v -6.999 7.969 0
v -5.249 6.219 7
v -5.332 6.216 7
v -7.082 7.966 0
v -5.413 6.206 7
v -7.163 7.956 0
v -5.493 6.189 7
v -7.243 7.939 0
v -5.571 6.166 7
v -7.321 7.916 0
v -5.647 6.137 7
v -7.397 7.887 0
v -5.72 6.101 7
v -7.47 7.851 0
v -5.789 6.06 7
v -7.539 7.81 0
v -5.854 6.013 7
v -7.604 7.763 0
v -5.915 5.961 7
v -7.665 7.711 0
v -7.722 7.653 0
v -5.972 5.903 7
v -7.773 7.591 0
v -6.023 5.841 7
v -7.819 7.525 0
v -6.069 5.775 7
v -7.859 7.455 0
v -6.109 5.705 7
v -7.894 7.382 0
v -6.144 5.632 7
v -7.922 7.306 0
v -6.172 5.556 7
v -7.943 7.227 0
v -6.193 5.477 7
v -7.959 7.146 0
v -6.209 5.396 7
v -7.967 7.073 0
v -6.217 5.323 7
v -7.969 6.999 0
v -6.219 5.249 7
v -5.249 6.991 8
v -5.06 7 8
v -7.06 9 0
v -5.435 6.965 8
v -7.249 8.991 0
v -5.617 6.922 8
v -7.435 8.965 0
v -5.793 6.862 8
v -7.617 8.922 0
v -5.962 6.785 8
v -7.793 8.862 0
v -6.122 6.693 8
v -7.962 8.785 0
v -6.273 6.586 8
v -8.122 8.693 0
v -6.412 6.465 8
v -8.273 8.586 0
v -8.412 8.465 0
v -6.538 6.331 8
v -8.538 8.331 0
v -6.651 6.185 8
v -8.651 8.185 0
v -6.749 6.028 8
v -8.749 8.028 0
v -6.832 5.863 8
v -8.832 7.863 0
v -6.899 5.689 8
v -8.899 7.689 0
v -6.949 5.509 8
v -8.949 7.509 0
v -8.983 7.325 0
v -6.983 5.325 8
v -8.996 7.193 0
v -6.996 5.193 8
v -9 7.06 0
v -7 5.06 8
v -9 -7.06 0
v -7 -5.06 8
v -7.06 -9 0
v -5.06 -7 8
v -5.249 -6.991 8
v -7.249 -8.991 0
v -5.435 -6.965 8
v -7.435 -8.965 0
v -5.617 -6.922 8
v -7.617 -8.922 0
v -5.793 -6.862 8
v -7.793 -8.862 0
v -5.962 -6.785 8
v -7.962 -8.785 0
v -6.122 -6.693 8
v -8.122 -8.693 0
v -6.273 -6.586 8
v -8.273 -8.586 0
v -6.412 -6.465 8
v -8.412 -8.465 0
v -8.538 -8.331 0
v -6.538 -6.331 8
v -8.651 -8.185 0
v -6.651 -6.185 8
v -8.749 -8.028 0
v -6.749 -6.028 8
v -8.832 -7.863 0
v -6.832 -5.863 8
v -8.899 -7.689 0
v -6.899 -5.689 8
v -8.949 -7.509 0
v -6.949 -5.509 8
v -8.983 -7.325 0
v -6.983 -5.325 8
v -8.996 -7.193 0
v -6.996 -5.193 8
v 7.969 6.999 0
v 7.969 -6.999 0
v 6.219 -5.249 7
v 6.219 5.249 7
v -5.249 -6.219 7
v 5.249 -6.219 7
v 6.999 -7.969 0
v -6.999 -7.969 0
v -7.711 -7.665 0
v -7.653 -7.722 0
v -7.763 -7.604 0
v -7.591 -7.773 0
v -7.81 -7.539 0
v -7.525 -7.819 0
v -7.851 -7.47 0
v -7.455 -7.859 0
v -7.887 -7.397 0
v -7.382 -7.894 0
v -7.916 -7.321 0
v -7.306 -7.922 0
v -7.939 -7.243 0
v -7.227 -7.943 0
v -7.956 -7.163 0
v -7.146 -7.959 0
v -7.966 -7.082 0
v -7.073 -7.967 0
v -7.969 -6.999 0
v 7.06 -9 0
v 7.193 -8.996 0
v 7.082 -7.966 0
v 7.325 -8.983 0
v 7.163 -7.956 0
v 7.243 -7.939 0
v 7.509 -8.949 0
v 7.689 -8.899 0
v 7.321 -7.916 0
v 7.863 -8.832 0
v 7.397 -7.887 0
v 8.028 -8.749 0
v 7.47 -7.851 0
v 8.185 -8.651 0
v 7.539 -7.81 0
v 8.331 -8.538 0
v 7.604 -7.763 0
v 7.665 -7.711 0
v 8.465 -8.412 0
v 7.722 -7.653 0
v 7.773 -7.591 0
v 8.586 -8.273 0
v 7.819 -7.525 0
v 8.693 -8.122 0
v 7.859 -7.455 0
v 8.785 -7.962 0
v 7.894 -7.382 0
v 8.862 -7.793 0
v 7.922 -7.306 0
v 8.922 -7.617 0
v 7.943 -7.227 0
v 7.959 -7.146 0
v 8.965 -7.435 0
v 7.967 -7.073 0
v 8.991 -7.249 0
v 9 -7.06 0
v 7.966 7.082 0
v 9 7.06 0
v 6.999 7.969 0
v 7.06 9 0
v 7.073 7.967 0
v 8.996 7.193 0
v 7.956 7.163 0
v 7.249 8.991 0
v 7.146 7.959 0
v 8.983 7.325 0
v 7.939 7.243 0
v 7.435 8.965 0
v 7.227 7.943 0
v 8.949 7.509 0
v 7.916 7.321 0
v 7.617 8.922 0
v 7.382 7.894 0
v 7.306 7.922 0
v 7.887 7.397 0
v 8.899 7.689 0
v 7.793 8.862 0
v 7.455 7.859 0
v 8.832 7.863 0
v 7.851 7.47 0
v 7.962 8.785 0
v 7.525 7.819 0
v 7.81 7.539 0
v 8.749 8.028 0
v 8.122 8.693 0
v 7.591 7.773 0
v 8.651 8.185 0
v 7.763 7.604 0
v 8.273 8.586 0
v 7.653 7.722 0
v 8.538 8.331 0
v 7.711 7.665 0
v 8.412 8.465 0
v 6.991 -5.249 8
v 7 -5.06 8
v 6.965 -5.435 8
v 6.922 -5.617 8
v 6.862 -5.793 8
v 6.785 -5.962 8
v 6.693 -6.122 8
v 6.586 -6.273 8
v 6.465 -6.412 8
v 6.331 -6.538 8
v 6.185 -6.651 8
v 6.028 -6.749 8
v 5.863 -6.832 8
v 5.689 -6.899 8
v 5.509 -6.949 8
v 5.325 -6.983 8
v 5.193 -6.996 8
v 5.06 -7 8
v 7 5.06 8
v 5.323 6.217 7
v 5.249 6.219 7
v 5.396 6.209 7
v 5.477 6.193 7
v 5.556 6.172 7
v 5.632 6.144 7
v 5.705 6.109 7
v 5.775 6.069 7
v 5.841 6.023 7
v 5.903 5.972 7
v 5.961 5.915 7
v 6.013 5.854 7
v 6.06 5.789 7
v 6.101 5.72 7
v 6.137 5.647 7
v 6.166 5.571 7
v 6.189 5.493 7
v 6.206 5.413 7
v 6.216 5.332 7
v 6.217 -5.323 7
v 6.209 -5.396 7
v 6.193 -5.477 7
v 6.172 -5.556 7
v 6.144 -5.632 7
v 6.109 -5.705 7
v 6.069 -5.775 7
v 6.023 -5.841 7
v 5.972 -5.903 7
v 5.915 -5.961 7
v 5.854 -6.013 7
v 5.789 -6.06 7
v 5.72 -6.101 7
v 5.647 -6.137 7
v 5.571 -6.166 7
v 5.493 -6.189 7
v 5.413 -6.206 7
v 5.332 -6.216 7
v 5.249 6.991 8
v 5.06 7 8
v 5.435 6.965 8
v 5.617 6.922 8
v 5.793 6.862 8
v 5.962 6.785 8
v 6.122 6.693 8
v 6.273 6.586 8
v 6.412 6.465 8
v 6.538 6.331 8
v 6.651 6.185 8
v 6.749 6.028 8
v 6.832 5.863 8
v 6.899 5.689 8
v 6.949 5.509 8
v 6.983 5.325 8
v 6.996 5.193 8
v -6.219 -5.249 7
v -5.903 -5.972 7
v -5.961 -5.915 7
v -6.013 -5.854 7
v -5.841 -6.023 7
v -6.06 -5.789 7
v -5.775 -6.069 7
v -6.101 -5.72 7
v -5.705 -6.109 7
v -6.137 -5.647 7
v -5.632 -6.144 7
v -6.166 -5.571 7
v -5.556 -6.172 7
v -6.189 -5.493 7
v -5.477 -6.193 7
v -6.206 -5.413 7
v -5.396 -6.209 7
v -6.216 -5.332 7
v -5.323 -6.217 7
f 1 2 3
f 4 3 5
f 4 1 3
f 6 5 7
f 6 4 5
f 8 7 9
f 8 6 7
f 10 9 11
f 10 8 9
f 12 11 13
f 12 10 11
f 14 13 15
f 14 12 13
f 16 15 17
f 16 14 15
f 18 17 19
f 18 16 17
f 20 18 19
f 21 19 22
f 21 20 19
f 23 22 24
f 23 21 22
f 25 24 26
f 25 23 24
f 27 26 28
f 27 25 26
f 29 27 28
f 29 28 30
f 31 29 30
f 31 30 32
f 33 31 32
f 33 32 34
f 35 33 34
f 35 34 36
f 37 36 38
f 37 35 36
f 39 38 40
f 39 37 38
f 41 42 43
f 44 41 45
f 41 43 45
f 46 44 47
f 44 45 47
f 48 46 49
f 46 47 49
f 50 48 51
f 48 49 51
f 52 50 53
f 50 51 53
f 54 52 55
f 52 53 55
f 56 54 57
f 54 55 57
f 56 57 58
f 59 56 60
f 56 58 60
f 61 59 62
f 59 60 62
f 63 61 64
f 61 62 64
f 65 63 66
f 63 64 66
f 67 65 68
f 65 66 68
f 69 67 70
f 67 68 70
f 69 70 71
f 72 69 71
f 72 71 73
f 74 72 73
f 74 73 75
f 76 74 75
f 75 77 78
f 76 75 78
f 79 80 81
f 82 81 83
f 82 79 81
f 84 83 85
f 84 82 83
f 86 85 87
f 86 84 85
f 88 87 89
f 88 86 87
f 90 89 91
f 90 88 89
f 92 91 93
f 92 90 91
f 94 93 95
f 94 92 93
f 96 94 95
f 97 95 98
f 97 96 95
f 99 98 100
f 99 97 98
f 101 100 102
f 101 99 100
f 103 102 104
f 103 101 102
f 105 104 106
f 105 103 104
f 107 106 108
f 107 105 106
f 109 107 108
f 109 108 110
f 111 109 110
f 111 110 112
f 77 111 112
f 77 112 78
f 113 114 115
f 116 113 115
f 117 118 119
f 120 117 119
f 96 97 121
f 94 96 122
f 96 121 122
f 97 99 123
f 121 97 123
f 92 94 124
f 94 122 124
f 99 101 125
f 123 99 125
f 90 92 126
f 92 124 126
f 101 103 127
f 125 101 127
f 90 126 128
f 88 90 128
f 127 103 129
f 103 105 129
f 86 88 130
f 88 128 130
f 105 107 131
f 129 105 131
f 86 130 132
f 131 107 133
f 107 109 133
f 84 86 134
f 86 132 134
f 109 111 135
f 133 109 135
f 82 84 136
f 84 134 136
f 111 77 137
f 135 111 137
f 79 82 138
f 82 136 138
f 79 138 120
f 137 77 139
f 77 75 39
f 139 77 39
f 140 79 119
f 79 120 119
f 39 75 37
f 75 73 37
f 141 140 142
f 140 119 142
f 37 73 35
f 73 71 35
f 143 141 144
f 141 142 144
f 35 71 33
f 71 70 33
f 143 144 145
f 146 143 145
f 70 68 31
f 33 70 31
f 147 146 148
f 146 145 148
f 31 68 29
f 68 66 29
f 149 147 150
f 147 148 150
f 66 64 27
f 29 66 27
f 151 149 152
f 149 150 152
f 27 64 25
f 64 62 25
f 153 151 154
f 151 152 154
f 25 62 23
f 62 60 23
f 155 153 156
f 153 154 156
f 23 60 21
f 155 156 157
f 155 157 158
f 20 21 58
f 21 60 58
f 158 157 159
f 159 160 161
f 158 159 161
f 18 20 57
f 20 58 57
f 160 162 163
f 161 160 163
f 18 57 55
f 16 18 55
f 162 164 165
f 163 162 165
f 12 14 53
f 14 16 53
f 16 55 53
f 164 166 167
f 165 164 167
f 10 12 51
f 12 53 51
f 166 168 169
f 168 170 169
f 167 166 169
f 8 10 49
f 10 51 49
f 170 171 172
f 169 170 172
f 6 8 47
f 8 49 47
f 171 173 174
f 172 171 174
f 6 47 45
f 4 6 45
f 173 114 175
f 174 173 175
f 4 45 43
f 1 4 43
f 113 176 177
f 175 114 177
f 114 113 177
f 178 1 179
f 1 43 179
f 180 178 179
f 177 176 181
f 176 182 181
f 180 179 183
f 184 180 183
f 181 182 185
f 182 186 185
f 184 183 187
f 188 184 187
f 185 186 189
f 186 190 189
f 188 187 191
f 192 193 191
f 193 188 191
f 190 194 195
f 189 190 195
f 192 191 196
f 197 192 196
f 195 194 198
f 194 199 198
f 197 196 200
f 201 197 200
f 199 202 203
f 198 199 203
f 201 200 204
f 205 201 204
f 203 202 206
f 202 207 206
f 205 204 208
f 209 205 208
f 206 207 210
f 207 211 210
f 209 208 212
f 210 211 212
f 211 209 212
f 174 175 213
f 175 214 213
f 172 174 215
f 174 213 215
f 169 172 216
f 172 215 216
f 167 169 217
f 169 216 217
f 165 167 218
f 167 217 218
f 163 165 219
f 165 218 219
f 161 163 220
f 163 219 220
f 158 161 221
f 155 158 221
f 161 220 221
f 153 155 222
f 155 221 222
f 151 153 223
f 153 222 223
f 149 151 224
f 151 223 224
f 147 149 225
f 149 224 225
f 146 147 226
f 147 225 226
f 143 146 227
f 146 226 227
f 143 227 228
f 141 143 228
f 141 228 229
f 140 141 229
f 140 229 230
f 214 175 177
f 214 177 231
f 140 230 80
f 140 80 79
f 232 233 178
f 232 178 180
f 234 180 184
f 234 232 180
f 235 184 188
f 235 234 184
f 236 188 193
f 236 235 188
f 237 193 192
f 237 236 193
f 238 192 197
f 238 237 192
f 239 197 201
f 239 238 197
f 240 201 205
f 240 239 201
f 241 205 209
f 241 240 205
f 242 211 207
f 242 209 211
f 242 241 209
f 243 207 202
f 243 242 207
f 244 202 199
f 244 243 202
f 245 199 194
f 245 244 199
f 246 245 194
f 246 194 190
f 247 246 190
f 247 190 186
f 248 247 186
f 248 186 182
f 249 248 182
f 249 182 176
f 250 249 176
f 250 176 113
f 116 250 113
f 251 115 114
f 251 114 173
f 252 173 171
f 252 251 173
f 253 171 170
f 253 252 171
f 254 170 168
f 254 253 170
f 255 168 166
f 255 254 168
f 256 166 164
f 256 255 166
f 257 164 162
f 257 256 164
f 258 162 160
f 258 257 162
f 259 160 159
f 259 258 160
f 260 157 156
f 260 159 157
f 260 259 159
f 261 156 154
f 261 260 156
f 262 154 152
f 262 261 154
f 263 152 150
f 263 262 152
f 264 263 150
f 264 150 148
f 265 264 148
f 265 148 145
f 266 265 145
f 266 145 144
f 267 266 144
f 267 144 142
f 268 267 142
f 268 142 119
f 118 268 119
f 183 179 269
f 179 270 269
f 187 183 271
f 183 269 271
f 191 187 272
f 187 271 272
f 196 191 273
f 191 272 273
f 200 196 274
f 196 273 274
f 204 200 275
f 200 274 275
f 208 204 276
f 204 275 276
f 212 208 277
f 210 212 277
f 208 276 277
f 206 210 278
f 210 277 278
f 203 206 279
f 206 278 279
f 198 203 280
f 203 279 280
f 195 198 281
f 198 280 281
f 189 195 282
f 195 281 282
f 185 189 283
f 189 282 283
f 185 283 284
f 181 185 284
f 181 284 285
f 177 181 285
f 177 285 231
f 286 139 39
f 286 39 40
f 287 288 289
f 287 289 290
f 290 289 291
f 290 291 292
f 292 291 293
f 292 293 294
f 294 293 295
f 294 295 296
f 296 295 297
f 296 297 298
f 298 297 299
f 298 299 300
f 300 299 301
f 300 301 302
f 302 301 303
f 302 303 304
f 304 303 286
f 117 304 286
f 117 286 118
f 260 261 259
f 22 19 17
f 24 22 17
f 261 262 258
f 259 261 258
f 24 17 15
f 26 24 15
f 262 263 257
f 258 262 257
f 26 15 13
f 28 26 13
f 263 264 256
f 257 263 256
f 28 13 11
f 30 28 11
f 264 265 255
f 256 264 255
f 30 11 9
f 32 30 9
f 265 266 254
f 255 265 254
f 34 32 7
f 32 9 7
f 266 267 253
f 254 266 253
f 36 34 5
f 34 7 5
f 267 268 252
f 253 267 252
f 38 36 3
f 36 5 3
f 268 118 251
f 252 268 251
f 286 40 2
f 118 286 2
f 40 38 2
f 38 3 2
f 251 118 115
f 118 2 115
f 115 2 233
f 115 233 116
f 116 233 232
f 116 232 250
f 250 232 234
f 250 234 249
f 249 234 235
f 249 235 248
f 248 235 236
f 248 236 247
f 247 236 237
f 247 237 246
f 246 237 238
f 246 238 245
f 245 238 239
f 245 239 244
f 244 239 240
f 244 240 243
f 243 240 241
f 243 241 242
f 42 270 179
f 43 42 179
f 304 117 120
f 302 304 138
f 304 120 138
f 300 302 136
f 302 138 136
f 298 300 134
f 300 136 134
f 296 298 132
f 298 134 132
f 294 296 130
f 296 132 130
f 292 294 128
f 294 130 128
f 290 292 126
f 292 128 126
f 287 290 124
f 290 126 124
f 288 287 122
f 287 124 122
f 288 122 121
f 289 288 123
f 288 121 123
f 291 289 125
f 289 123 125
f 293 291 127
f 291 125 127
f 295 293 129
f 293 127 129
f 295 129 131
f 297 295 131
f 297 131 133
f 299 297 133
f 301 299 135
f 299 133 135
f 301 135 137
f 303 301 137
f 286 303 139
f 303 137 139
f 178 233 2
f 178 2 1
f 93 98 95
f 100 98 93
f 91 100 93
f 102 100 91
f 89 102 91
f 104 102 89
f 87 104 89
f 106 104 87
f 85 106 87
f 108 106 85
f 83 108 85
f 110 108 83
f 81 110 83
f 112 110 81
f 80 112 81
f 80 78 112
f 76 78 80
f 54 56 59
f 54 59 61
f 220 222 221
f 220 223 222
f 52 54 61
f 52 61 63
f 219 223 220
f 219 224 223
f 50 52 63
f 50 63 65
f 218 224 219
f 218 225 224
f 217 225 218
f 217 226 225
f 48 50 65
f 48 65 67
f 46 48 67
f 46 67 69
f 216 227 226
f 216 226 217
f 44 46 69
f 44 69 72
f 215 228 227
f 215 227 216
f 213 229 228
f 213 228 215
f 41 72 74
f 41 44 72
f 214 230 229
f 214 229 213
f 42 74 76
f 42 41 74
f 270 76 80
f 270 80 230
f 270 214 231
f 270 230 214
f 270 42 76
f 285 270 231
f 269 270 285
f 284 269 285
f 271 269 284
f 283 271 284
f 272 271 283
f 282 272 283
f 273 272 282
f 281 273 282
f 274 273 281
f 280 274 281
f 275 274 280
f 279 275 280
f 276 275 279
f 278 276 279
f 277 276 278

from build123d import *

# Parameters (mm, degrees)
SKETCH_W             = 18
SKETCH_H             = 18
PAD_DEPTH            = 8
POCKET_DEPTH         = 18.001
POCKET001_DEPTH      = 9.001
POCKET001_DEPTH_BACK = 9.001
FILLET_R             = 2
THICKNESS_T          = -1


with BuildPart() as part:
    # Sketch → Pad (new body)
    with BuildSketch(Plane.XY):
        Rectangle(SKETCH_W, SKETCH_H)
    extrude(amount=PAD_DEPTH)

    # Sketch001 (on Face1 of Pad) → Pocket (cut, through all)
    with BuildSketch(Plane.XZ.offset(9)):
        Polygon((-9, 8), (-9, 0), (-7, 8), align=None)
        Polygon((9, 8), (9, 0), (7, 8), align=None)
    extrude(amount=-POCKET_DEPTH, mode=Mode.SUBTRACT)

    # Sketch002 → Pocket001 (cut, two sides)
    with BuildSketch(Plane.YZ) as pocket001_sk:
        Polygon((-9, 8), (-7, 8), (-9, 0), align=None)
        Polygon((9, 8), (7, 8), (9, 0), align=None)
    extrude(amount=-POCKET001_DEPTH, mode=Mode.SUBTRACT)
    extrude(pocket001_sk.sketch, amount=POCKET001_DEPTH_BACK, mode=Mode.SUBTRACT)

    # Fillet
    fillet_edges = [part.edges().sort_by_distance(p)[0] for p in [
        (-8, 8, 4),
        (-8, -8, 4),
        (8, -8, 4),
        (8, 8, 4),
    ]]
    fillet(fillet_edges, radius=FILLET_R)

    # Thickness
    thickness_openings = [part.faces().sort_by_distance(p)[0] for p in [
        (0, 0, 0),
    ]]
    offset(amount=THICKNESS_T, openings=thickness_openings, kind=Kind.INTERSECTION)


solid = part.part
